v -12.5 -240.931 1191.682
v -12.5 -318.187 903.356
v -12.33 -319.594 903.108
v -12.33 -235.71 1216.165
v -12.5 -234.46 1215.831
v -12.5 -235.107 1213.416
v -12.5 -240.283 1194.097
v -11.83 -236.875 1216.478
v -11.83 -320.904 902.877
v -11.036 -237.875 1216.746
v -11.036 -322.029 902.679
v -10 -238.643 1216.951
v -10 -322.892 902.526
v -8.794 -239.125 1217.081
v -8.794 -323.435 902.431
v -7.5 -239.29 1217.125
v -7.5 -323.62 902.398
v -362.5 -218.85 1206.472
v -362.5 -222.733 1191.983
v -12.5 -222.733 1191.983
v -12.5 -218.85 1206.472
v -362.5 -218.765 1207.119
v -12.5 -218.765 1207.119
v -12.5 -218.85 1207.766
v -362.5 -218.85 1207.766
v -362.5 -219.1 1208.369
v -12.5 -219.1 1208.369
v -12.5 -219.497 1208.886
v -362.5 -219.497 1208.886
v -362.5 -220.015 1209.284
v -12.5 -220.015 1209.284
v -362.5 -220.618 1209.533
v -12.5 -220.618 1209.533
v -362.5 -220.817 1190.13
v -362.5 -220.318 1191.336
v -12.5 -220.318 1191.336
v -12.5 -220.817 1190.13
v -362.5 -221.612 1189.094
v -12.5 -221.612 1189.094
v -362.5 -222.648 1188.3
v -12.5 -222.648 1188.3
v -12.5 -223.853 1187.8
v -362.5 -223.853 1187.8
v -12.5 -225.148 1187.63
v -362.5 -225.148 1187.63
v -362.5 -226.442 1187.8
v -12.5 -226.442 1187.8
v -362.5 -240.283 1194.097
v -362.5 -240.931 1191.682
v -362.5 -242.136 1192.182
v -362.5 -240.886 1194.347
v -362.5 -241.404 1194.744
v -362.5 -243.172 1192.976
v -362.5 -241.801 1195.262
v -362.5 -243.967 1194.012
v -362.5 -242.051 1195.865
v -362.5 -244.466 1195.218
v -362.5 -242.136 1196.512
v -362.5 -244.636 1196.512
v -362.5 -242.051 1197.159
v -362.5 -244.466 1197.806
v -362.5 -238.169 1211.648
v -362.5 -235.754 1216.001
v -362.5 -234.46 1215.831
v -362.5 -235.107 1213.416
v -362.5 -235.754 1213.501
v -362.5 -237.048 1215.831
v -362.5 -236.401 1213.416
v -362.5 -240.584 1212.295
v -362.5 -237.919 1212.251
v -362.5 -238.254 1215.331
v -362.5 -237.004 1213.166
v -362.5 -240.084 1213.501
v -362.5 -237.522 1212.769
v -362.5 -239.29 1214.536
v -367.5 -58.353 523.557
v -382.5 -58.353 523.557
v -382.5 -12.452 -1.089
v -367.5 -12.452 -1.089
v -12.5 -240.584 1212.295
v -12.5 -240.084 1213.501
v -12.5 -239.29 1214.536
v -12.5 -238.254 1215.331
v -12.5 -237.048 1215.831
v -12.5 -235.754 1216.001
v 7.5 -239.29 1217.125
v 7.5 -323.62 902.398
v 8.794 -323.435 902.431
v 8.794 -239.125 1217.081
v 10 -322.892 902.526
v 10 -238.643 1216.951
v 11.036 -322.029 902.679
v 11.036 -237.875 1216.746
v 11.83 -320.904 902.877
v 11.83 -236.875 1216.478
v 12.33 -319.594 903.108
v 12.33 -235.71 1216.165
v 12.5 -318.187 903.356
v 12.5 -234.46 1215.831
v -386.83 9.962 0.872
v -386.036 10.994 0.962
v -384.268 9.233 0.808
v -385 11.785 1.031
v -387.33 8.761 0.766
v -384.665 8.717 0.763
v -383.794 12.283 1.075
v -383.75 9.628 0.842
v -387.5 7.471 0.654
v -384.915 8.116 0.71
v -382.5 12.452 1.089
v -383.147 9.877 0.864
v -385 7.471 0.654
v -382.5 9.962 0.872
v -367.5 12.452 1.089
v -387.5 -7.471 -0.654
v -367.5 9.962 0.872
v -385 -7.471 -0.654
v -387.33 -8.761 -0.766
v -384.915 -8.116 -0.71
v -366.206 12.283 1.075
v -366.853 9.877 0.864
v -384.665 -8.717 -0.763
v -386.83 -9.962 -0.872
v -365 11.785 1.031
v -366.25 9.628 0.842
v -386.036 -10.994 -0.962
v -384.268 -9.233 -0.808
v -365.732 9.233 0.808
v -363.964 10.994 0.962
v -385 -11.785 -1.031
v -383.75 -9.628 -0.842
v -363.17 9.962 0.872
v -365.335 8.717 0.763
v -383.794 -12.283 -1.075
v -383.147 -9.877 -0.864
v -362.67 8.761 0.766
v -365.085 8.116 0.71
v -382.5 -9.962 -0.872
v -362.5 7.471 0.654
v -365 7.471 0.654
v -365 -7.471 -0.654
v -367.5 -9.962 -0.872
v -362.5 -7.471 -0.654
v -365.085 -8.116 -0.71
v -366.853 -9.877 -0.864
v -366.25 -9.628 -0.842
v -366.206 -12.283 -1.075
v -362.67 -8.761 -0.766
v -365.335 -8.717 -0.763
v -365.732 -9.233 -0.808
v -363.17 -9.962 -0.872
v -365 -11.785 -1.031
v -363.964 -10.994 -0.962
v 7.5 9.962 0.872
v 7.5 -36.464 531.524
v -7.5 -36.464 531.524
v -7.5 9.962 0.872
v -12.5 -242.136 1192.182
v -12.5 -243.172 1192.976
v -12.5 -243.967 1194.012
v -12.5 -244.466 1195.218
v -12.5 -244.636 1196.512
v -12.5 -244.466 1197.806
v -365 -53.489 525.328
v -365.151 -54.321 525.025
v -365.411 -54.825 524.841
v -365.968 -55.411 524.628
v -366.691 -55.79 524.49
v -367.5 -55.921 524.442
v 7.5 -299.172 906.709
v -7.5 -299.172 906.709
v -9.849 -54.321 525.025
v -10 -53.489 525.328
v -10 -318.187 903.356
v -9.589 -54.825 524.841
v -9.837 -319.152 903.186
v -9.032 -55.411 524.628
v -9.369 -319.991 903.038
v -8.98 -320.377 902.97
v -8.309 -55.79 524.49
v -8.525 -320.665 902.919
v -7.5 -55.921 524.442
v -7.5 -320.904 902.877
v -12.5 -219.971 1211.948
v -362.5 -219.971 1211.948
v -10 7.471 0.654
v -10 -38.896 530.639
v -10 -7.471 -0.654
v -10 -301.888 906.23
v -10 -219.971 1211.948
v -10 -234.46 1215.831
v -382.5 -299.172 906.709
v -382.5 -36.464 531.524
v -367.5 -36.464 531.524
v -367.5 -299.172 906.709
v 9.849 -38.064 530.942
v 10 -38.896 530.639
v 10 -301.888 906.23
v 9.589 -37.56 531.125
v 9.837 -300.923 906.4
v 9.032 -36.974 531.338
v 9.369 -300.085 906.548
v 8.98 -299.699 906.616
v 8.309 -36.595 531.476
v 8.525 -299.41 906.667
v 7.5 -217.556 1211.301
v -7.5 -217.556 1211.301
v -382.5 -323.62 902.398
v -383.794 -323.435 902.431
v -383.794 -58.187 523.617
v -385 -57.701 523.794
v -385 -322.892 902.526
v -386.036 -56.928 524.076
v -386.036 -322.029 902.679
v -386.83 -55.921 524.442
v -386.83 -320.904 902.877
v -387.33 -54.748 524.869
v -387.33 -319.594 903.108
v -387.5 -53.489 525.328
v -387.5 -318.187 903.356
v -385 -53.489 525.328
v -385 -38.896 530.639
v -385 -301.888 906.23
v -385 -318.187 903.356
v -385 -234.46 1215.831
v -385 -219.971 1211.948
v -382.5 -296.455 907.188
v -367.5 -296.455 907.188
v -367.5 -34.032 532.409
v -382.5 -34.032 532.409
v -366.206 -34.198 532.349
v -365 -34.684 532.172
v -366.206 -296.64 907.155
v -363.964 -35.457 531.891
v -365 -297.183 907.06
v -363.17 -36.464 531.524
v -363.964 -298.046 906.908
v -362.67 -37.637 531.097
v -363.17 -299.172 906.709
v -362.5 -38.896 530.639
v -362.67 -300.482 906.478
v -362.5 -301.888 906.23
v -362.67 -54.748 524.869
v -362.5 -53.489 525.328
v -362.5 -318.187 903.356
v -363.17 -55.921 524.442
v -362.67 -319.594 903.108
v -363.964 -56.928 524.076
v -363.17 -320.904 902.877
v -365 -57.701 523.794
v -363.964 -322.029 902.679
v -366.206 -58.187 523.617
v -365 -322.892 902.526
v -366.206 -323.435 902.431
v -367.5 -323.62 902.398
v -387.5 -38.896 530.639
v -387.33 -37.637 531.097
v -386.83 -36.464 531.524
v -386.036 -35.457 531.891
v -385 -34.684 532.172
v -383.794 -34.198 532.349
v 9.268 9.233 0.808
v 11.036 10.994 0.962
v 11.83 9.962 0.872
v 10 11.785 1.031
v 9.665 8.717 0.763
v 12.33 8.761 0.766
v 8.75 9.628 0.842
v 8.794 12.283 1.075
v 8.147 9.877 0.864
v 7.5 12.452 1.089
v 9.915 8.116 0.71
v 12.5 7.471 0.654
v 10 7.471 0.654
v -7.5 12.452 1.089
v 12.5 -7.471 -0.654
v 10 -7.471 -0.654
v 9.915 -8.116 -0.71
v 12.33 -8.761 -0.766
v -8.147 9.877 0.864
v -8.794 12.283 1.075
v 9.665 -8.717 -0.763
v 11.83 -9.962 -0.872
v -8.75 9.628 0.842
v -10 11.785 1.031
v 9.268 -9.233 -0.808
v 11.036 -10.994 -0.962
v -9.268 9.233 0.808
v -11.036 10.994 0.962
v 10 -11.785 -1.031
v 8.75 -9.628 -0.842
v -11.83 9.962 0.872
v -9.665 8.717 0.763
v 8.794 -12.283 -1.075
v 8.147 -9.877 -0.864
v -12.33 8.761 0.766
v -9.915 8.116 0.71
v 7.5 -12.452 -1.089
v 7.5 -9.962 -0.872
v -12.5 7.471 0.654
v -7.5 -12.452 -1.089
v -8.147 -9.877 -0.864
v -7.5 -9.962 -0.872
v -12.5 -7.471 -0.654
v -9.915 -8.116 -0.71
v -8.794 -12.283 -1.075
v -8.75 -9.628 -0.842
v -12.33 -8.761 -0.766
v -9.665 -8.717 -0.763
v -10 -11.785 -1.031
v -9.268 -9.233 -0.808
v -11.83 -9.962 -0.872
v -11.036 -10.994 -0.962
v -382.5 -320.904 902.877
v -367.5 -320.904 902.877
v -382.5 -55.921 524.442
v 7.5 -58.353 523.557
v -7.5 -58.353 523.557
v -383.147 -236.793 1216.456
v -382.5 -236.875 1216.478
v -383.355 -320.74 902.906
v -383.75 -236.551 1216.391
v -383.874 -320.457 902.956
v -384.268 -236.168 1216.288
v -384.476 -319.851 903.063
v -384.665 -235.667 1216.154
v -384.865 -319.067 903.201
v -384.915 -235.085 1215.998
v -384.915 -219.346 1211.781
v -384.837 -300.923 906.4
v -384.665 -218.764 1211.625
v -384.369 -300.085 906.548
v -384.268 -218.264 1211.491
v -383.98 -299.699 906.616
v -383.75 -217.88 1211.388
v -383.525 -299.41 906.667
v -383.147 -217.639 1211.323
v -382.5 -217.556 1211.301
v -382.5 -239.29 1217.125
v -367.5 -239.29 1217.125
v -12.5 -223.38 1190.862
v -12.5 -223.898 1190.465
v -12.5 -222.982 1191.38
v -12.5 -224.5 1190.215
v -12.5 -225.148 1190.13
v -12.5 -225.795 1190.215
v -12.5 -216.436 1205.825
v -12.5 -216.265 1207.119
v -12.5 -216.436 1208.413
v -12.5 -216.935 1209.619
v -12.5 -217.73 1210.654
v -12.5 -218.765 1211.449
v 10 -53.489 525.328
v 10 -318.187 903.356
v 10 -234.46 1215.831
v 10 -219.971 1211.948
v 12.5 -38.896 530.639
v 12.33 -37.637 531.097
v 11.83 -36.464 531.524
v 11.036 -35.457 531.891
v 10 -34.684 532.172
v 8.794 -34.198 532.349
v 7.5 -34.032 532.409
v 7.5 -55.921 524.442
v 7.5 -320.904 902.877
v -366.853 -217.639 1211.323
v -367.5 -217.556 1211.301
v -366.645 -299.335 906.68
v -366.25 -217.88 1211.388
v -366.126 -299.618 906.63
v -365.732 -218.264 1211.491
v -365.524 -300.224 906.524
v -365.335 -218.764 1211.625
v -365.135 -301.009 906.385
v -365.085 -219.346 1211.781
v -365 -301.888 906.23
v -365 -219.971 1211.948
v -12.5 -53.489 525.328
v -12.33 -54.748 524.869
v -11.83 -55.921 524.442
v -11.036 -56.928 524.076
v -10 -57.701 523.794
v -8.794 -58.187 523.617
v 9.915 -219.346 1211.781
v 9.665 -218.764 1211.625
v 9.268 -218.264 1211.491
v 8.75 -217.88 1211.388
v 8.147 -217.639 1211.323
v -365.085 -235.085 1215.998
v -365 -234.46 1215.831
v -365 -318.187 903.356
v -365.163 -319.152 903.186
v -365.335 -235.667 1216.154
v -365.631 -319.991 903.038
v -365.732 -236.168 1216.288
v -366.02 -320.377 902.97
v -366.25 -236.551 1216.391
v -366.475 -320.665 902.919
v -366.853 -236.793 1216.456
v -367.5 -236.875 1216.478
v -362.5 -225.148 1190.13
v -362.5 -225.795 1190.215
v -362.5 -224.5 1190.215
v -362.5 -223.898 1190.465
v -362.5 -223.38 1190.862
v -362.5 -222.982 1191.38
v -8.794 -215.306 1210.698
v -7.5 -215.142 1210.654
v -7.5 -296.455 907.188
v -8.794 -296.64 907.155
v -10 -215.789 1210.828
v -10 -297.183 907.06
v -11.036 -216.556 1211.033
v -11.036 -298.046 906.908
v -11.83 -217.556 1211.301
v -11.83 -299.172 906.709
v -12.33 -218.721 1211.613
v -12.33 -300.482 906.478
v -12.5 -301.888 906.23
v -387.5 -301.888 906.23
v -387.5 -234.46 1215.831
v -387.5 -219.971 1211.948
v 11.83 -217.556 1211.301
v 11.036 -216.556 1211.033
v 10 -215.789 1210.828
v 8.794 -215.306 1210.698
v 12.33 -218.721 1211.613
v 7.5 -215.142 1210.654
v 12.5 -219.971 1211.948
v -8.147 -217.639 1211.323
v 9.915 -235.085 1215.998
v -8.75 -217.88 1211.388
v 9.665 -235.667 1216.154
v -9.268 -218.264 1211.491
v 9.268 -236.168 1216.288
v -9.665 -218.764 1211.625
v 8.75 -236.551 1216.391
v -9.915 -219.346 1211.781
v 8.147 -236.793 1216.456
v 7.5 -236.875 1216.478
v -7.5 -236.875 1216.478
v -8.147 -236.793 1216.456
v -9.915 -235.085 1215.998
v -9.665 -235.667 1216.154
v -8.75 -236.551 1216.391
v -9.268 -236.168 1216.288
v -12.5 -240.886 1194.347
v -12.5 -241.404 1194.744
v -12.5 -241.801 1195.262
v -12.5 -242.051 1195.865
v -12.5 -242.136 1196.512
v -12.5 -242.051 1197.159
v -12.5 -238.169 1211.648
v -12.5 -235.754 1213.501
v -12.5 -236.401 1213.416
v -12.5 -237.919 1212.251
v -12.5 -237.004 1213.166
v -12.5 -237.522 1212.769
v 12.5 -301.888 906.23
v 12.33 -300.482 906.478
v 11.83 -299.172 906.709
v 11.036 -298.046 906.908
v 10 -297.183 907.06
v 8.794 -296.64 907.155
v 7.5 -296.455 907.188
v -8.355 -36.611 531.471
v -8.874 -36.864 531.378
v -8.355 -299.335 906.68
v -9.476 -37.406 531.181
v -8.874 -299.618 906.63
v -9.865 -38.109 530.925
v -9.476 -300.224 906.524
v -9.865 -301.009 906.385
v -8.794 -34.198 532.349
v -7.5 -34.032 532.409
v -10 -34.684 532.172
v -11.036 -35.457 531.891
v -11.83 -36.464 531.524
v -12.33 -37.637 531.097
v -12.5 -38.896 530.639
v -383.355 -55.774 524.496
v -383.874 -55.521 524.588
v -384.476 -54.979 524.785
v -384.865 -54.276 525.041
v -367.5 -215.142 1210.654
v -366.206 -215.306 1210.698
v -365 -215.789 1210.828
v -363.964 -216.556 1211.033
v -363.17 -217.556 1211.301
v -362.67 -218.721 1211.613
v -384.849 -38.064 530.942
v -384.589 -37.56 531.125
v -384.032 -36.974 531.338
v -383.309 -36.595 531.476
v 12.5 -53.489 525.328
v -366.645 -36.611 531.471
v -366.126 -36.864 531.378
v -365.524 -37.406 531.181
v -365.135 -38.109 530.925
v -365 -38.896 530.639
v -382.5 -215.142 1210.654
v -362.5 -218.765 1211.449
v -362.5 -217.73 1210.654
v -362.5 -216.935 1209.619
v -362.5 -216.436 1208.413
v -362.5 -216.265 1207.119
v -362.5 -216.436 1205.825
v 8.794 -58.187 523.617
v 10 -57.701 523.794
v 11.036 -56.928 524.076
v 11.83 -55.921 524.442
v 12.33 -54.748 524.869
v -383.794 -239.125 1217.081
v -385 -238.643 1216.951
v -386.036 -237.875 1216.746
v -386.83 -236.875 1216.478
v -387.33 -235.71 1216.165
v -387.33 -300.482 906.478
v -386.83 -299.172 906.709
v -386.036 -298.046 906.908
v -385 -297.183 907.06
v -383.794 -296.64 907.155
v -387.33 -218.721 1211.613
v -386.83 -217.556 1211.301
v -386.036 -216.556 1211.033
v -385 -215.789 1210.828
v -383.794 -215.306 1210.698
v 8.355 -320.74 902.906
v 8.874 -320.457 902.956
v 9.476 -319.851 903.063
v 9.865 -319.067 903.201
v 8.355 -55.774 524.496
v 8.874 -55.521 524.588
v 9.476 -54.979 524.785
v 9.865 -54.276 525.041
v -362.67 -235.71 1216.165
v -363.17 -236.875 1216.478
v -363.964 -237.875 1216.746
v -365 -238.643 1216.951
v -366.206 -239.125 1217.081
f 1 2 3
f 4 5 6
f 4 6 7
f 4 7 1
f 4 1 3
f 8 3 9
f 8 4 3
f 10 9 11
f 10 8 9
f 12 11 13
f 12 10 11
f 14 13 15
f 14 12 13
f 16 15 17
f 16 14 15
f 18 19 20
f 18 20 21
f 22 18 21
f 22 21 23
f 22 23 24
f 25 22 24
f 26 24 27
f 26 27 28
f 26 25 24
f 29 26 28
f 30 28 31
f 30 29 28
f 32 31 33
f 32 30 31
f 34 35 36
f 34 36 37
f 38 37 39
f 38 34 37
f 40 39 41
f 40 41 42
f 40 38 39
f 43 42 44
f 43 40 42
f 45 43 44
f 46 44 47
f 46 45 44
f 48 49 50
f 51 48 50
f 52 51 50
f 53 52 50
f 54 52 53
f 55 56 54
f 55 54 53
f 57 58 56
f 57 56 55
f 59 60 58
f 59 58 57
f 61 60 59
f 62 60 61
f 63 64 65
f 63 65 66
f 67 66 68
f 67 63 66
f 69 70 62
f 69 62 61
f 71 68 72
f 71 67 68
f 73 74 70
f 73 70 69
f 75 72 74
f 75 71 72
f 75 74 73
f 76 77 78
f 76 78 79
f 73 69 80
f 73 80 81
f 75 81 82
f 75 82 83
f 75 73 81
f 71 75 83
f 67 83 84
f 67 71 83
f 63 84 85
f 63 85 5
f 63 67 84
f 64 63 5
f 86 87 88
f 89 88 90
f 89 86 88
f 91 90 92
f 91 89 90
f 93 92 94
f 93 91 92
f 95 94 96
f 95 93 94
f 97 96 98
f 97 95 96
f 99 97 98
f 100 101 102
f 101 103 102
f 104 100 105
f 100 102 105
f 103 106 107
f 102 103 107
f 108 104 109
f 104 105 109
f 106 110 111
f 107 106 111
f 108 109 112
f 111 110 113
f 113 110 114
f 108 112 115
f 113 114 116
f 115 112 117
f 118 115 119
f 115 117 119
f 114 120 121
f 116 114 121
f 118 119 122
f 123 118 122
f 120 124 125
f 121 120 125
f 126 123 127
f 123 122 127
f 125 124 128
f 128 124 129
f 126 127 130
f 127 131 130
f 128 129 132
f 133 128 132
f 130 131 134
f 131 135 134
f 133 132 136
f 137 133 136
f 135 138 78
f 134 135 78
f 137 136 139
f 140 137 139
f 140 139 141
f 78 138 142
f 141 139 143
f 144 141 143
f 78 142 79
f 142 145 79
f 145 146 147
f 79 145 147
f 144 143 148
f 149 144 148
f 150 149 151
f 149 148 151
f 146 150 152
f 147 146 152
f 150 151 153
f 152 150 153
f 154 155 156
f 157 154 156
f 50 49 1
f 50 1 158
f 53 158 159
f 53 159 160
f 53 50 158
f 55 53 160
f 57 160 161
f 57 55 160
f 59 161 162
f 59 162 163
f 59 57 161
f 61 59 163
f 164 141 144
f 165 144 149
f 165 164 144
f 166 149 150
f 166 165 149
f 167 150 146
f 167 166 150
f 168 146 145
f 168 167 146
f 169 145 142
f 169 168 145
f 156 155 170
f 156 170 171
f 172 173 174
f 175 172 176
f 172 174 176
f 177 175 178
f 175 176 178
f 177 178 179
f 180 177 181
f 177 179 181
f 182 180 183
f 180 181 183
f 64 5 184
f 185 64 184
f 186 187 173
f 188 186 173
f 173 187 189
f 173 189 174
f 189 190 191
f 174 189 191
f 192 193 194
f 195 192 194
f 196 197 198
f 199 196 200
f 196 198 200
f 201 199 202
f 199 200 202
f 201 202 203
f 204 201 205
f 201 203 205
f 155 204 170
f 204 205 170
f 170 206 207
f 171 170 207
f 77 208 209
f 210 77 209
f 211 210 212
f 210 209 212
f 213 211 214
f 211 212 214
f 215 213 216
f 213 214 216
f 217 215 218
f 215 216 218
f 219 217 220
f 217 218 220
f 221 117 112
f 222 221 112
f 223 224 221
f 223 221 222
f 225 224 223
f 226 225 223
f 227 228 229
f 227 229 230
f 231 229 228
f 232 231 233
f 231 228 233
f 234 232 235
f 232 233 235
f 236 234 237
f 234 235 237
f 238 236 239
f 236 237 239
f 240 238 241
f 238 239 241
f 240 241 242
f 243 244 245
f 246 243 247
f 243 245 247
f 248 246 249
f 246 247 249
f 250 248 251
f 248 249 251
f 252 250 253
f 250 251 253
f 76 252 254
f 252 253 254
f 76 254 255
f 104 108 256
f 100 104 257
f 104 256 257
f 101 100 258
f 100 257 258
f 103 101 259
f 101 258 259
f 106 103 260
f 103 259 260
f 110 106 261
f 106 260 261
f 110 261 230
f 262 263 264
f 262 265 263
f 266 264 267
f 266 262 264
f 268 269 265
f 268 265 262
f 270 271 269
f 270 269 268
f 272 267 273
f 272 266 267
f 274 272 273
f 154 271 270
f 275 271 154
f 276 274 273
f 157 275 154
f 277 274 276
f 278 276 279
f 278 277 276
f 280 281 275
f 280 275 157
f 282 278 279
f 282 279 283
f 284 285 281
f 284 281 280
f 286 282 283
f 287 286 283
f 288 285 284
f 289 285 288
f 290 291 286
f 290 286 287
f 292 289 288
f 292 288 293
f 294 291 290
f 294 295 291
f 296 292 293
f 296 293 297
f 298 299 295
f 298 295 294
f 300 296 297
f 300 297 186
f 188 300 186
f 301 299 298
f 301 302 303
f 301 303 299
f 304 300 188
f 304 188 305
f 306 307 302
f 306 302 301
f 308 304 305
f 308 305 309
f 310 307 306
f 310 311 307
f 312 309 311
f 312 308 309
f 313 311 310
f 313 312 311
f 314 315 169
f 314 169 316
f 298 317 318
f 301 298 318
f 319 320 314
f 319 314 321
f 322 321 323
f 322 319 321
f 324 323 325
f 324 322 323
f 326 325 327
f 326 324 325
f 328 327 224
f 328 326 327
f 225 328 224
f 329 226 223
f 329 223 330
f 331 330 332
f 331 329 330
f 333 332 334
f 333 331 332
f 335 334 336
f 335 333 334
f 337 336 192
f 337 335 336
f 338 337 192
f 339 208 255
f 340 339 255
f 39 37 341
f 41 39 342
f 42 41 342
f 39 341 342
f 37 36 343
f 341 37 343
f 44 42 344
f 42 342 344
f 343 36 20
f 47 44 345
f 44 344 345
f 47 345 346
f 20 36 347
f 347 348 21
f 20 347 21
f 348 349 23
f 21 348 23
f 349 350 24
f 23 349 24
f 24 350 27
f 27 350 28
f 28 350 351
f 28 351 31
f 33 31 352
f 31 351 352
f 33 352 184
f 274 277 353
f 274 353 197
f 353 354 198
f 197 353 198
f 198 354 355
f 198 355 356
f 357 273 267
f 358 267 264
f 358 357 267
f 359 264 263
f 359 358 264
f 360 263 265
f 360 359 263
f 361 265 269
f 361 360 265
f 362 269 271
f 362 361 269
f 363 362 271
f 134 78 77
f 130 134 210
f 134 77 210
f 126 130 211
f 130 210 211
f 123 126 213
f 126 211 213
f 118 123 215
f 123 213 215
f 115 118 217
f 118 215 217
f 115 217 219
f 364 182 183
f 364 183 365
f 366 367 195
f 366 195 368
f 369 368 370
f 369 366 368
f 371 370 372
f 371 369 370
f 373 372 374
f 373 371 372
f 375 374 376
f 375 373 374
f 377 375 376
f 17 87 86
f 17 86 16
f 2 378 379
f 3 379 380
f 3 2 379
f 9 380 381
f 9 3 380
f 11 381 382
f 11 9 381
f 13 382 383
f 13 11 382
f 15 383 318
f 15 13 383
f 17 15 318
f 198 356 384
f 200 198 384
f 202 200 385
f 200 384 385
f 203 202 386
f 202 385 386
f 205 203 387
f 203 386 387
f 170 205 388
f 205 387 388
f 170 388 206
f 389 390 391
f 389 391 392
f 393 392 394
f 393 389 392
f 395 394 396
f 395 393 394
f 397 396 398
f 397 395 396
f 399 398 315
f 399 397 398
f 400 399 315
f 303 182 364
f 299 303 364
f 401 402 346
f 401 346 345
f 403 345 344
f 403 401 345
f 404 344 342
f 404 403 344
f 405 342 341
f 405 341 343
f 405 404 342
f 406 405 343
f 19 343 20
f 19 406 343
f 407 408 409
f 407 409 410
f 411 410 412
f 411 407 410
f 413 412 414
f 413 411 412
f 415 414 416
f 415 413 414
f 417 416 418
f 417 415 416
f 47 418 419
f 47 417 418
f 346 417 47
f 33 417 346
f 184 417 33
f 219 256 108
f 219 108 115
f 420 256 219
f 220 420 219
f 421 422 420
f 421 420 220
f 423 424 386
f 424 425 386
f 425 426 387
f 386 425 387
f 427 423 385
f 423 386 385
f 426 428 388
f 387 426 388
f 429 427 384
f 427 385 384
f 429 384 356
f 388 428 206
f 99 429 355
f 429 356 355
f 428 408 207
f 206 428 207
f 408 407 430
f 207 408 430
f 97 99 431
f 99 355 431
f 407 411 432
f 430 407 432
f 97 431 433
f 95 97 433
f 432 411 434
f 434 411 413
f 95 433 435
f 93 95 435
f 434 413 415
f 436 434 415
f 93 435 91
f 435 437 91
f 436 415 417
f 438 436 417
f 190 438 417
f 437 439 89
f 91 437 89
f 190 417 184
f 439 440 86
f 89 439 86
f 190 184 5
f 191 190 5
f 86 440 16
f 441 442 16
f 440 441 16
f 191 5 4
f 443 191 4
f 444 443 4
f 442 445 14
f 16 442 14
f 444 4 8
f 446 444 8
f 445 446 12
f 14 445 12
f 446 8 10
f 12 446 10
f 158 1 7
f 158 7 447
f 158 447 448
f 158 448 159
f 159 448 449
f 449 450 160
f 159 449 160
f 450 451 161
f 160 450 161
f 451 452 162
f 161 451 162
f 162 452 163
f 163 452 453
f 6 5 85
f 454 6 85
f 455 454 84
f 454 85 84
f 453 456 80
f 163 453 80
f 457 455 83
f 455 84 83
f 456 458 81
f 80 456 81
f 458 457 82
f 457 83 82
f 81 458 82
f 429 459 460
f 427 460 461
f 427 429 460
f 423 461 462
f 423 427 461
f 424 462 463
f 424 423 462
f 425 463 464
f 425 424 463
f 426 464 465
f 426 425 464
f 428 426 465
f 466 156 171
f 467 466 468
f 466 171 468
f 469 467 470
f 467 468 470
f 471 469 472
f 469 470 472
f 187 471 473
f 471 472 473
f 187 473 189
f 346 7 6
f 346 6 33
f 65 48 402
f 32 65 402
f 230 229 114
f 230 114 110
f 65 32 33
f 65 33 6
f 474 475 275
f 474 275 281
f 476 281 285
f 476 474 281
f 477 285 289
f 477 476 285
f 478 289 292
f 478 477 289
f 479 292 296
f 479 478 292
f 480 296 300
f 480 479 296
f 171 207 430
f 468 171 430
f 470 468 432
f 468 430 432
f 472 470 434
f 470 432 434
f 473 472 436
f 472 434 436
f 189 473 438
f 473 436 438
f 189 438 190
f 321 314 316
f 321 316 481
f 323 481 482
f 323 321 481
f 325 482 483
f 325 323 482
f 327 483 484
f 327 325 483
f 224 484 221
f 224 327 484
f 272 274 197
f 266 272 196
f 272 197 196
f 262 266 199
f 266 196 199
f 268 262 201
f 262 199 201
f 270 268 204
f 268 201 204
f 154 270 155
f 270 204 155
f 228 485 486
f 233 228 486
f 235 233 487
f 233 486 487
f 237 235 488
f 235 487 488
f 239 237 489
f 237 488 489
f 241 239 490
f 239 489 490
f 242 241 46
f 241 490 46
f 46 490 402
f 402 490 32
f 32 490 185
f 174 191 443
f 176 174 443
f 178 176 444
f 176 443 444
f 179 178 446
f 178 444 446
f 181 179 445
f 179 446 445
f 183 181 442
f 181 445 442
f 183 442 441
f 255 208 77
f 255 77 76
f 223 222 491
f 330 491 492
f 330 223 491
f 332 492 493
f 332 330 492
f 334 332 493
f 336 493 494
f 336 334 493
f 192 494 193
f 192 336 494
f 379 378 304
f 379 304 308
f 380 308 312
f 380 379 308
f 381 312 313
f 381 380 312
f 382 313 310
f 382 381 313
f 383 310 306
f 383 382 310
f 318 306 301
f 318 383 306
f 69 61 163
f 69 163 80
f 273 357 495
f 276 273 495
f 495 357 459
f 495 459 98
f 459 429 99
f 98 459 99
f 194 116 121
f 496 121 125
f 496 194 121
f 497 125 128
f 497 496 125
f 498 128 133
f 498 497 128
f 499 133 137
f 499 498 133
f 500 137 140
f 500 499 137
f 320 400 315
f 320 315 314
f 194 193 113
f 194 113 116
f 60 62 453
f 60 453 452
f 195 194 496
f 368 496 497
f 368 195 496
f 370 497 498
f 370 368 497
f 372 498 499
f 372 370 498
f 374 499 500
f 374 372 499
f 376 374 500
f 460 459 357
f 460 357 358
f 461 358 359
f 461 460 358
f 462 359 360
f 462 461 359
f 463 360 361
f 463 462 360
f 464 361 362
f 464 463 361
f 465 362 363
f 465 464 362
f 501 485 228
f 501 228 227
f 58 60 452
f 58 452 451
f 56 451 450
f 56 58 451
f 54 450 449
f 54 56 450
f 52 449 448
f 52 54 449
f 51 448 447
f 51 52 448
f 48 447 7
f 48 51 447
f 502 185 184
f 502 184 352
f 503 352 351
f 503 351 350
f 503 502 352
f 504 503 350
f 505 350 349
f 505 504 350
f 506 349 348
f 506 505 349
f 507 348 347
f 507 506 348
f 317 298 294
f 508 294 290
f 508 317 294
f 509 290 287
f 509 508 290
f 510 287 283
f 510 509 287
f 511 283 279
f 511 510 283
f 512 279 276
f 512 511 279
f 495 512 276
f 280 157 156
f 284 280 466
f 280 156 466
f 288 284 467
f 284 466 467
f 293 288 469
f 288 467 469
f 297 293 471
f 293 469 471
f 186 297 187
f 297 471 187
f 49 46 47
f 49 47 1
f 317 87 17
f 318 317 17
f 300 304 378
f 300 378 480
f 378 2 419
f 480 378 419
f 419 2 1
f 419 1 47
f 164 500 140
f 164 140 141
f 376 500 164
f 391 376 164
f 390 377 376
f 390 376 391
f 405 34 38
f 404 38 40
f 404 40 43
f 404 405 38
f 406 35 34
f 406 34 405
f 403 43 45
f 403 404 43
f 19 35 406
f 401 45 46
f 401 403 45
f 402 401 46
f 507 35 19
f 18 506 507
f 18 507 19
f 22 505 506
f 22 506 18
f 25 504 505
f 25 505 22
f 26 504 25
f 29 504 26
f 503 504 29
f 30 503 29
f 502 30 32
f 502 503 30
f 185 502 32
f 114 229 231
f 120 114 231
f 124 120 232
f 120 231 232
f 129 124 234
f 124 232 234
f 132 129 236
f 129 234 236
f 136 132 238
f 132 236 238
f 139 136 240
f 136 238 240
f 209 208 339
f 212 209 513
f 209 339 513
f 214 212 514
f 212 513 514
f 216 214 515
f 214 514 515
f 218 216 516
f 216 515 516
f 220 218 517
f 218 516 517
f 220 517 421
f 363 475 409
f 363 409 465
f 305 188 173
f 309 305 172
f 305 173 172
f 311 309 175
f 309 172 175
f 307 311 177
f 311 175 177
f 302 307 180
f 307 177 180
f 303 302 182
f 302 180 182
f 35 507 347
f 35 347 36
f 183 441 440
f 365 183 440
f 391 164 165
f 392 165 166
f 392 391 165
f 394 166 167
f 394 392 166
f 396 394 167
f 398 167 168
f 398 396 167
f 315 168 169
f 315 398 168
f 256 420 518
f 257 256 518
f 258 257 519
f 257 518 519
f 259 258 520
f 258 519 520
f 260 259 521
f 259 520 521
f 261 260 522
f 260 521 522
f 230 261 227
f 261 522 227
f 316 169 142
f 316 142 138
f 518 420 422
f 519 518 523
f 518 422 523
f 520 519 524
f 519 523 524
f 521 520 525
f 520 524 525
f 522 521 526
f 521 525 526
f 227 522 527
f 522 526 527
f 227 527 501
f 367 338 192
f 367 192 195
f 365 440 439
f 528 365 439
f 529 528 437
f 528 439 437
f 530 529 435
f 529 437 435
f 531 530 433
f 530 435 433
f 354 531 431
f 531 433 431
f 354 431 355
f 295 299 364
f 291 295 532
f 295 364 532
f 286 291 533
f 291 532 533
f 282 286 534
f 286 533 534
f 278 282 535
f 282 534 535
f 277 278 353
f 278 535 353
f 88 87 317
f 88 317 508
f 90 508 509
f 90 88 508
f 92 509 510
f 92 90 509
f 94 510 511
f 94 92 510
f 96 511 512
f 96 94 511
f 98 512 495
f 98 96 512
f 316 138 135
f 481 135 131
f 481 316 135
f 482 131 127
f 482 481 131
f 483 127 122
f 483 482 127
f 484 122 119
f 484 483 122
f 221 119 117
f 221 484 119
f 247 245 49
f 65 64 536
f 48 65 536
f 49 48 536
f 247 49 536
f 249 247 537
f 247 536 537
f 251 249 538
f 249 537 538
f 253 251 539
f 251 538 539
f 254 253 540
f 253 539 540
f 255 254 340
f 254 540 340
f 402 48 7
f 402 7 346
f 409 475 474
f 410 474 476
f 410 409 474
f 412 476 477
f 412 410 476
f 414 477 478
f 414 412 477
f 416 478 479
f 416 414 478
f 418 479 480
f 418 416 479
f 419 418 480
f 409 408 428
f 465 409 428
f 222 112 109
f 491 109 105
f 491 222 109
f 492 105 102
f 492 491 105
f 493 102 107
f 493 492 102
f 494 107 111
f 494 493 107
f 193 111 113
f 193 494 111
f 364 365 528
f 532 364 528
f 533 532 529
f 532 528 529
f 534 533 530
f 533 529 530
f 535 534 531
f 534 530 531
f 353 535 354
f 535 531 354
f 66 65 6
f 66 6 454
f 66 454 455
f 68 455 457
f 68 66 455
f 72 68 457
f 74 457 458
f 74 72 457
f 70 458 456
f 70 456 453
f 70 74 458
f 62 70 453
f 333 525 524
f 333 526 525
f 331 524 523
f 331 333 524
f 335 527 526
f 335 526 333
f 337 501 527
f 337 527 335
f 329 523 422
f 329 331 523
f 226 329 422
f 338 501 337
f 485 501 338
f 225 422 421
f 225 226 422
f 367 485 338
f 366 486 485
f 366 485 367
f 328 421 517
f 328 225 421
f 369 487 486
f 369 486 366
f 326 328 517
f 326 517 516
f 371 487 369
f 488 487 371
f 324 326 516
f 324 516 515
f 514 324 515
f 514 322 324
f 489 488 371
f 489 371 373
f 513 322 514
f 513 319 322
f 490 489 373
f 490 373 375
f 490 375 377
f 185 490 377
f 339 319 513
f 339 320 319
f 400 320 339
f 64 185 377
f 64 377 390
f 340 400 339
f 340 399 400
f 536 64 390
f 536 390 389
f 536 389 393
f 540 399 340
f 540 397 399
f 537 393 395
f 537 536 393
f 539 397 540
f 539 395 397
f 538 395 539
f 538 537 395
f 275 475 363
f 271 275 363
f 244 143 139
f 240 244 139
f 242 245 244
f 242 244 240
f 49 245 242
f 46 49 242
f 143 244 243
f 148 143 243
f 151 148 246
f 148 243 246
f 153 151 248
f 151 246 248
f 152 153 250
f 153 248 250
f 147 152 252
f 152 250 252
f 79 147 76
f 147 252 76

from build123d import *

# Parameters (mm, degrees)
F5_DEPTH = 175


with BuildPart() as f3:
    # F3: sweep along a path in F0
    with BuildLine(Plane.YZ) as f3_path:
        Line((0, 0), (-46.1925436563, 527.9831899886))
        Line((-46.1925436563, 527.9831899886), (-310.0377043777, 904.7931303616))
        Line((-310.0377043777, 904.7931303616), (-227.2156099449, 1213.8893947741))
    # F2 (on line) → F3 (sweep)
    with BuildSketch(Plane(origin=(0, 0, 0), x_dir=(1, 0, 0), z_dir=(0, 0.0871557427, -0.9961946981))):
        with BuildLine():
            ThreePointArc((-12.5, -7.5), (-11.0355339059, -11.0355339059), (-7.5, -12.5))
            Line((-7.5, -12.5), (7.5, -12.5))
            ThreePointArc((7.5, -12.5), (11.0355339059, -11.0355339059), (12.5, -7.5))
            Line((12.5, -7.5), (12.5, 7.5))
            ThreePointArc((12.5, 7.5), (11.0355339059, 11.0355339059), (7.5, 12.5))
            Line((7.5, 12.5), (-7.5, 12.5))
            ThreePointArc((-7.5, 12.5), (-11.0355339059, 11.0355339059), (-12.5, 7.5))
            Line((-12.5, 7.5), (-12.5, -7.5))
        make_face()
        with BuildLine():
            ThreePointArc((10, -7.5), (9.267766953, -9.267766953), (7.5, -10))
            Line((7.5, -10), (-7.5, -10))
            ThreePointArc((-7.5, -10), (-9.267766953, -9.267766953), (-10, -7.5))
            Line((-10, -7.5), (-10, 7.5))
            ThreePointArc((-10, 7.5), (-9.267766953, 9.267766953), (-7.5, 10))
            Line((-7.5, 10), (7.5, 10))
            ThreePointArc((7.5, 10), (9.267766953, 9.267766953), (10, 7.5))
            Line((10, 7.5), (10, -7.5))
        make_face(mode=Mode.SUBTRACT)
    sweep(path=f3_path.line, transition=Transition.RIGHT)

    # F4 (on face) → F5 (join)
    with BuildSketch(Plane(origin=(-12.5, 0, 0), x_dir=(0, -1, 0), z_dir=(-1, 0, 0))):
        with BuildLine():
            Line((234.4600536421, 1215.8305376123), (219.9711662478, 1211.9482519358))
            ThreePointArc((219.9711662478, 1211.9482519358), (216.9351344544, 1209.6186228043), (216.4356323418, 1205.8245275788))
            Line((216.4356323418, 1205.8245275788), (220.3179180184, 1191.3356401845))
            ThreePointArc((220.3179180184, 1191.3356401845), (222.6475471498, 1188.2996083911), (226.4416423753, 1187.8001062786))
            Line((226.4416423753, 1187.8001062786), (240.9305297697, 1191.6823919551))
            ThreePointArc((240.9305297697, 1191.6823919551), (243.9665615631, 1194.0120210866), (244.4660636756, 1197.8061163121))
            Line((244.4660636756, 1197.8061163121), (240.5837779991, 1212.2950037064))
            ThreePointArc((240.5837779991, 1212.2950037064), (238.2541488676, 1215.3310354998), (234.4600536421, 1215.8305376123))
        make_face()
        with BuildLine():
            ThreePointArc((235.1071012549, 1213.4157230466), (237.0041488676, 1213.1659719903), (238.1689634333, 1211.6479560936))
            Line((238.1689634333, 1211.6479560936), (242.0512491099, 1197.1590686993))
            ThreePointArc((242.0512491099, 1197.1590686993), (241.8014980536, 1195.2620210866), (240.2834821569, 1194.0972065208))
            Line((240.2834821569, 1194.0972065208), (225.7945947626, 1190.2149208443))
            ThreePointArc((225.7945947626, 1190.2149208443), (223.8975471498, 1190.4646719006), (222.7327325841, 1191.9826877973))
            Line((222.7327325841, 1191.9826877973), (218.8504469076, 1206.4715751916))
            ThreePointArc((218.8504469076, 1206.4715751916), (219.1001979638, 1208.3686228043), (220.6182138605, 1209.5334373701))
            Line((220.6182138605, 1209.5334373701), (235.1071012549, 1213.4157230466))
        make_face(mode=Mode.SUBTRACT)
    extrude(amount=F5_DEPTH)

    # F6: F3 across face


with BuildPart() as f3_1:
    add(f3.part)
    add(f3.part.mirror(Plane(origin=(-187.5, -230.4508480087, 1201.8153219455), x_dir=(0, -1, 0), z_dir=(-1, 0, 0))))


solid = f3_1.part
